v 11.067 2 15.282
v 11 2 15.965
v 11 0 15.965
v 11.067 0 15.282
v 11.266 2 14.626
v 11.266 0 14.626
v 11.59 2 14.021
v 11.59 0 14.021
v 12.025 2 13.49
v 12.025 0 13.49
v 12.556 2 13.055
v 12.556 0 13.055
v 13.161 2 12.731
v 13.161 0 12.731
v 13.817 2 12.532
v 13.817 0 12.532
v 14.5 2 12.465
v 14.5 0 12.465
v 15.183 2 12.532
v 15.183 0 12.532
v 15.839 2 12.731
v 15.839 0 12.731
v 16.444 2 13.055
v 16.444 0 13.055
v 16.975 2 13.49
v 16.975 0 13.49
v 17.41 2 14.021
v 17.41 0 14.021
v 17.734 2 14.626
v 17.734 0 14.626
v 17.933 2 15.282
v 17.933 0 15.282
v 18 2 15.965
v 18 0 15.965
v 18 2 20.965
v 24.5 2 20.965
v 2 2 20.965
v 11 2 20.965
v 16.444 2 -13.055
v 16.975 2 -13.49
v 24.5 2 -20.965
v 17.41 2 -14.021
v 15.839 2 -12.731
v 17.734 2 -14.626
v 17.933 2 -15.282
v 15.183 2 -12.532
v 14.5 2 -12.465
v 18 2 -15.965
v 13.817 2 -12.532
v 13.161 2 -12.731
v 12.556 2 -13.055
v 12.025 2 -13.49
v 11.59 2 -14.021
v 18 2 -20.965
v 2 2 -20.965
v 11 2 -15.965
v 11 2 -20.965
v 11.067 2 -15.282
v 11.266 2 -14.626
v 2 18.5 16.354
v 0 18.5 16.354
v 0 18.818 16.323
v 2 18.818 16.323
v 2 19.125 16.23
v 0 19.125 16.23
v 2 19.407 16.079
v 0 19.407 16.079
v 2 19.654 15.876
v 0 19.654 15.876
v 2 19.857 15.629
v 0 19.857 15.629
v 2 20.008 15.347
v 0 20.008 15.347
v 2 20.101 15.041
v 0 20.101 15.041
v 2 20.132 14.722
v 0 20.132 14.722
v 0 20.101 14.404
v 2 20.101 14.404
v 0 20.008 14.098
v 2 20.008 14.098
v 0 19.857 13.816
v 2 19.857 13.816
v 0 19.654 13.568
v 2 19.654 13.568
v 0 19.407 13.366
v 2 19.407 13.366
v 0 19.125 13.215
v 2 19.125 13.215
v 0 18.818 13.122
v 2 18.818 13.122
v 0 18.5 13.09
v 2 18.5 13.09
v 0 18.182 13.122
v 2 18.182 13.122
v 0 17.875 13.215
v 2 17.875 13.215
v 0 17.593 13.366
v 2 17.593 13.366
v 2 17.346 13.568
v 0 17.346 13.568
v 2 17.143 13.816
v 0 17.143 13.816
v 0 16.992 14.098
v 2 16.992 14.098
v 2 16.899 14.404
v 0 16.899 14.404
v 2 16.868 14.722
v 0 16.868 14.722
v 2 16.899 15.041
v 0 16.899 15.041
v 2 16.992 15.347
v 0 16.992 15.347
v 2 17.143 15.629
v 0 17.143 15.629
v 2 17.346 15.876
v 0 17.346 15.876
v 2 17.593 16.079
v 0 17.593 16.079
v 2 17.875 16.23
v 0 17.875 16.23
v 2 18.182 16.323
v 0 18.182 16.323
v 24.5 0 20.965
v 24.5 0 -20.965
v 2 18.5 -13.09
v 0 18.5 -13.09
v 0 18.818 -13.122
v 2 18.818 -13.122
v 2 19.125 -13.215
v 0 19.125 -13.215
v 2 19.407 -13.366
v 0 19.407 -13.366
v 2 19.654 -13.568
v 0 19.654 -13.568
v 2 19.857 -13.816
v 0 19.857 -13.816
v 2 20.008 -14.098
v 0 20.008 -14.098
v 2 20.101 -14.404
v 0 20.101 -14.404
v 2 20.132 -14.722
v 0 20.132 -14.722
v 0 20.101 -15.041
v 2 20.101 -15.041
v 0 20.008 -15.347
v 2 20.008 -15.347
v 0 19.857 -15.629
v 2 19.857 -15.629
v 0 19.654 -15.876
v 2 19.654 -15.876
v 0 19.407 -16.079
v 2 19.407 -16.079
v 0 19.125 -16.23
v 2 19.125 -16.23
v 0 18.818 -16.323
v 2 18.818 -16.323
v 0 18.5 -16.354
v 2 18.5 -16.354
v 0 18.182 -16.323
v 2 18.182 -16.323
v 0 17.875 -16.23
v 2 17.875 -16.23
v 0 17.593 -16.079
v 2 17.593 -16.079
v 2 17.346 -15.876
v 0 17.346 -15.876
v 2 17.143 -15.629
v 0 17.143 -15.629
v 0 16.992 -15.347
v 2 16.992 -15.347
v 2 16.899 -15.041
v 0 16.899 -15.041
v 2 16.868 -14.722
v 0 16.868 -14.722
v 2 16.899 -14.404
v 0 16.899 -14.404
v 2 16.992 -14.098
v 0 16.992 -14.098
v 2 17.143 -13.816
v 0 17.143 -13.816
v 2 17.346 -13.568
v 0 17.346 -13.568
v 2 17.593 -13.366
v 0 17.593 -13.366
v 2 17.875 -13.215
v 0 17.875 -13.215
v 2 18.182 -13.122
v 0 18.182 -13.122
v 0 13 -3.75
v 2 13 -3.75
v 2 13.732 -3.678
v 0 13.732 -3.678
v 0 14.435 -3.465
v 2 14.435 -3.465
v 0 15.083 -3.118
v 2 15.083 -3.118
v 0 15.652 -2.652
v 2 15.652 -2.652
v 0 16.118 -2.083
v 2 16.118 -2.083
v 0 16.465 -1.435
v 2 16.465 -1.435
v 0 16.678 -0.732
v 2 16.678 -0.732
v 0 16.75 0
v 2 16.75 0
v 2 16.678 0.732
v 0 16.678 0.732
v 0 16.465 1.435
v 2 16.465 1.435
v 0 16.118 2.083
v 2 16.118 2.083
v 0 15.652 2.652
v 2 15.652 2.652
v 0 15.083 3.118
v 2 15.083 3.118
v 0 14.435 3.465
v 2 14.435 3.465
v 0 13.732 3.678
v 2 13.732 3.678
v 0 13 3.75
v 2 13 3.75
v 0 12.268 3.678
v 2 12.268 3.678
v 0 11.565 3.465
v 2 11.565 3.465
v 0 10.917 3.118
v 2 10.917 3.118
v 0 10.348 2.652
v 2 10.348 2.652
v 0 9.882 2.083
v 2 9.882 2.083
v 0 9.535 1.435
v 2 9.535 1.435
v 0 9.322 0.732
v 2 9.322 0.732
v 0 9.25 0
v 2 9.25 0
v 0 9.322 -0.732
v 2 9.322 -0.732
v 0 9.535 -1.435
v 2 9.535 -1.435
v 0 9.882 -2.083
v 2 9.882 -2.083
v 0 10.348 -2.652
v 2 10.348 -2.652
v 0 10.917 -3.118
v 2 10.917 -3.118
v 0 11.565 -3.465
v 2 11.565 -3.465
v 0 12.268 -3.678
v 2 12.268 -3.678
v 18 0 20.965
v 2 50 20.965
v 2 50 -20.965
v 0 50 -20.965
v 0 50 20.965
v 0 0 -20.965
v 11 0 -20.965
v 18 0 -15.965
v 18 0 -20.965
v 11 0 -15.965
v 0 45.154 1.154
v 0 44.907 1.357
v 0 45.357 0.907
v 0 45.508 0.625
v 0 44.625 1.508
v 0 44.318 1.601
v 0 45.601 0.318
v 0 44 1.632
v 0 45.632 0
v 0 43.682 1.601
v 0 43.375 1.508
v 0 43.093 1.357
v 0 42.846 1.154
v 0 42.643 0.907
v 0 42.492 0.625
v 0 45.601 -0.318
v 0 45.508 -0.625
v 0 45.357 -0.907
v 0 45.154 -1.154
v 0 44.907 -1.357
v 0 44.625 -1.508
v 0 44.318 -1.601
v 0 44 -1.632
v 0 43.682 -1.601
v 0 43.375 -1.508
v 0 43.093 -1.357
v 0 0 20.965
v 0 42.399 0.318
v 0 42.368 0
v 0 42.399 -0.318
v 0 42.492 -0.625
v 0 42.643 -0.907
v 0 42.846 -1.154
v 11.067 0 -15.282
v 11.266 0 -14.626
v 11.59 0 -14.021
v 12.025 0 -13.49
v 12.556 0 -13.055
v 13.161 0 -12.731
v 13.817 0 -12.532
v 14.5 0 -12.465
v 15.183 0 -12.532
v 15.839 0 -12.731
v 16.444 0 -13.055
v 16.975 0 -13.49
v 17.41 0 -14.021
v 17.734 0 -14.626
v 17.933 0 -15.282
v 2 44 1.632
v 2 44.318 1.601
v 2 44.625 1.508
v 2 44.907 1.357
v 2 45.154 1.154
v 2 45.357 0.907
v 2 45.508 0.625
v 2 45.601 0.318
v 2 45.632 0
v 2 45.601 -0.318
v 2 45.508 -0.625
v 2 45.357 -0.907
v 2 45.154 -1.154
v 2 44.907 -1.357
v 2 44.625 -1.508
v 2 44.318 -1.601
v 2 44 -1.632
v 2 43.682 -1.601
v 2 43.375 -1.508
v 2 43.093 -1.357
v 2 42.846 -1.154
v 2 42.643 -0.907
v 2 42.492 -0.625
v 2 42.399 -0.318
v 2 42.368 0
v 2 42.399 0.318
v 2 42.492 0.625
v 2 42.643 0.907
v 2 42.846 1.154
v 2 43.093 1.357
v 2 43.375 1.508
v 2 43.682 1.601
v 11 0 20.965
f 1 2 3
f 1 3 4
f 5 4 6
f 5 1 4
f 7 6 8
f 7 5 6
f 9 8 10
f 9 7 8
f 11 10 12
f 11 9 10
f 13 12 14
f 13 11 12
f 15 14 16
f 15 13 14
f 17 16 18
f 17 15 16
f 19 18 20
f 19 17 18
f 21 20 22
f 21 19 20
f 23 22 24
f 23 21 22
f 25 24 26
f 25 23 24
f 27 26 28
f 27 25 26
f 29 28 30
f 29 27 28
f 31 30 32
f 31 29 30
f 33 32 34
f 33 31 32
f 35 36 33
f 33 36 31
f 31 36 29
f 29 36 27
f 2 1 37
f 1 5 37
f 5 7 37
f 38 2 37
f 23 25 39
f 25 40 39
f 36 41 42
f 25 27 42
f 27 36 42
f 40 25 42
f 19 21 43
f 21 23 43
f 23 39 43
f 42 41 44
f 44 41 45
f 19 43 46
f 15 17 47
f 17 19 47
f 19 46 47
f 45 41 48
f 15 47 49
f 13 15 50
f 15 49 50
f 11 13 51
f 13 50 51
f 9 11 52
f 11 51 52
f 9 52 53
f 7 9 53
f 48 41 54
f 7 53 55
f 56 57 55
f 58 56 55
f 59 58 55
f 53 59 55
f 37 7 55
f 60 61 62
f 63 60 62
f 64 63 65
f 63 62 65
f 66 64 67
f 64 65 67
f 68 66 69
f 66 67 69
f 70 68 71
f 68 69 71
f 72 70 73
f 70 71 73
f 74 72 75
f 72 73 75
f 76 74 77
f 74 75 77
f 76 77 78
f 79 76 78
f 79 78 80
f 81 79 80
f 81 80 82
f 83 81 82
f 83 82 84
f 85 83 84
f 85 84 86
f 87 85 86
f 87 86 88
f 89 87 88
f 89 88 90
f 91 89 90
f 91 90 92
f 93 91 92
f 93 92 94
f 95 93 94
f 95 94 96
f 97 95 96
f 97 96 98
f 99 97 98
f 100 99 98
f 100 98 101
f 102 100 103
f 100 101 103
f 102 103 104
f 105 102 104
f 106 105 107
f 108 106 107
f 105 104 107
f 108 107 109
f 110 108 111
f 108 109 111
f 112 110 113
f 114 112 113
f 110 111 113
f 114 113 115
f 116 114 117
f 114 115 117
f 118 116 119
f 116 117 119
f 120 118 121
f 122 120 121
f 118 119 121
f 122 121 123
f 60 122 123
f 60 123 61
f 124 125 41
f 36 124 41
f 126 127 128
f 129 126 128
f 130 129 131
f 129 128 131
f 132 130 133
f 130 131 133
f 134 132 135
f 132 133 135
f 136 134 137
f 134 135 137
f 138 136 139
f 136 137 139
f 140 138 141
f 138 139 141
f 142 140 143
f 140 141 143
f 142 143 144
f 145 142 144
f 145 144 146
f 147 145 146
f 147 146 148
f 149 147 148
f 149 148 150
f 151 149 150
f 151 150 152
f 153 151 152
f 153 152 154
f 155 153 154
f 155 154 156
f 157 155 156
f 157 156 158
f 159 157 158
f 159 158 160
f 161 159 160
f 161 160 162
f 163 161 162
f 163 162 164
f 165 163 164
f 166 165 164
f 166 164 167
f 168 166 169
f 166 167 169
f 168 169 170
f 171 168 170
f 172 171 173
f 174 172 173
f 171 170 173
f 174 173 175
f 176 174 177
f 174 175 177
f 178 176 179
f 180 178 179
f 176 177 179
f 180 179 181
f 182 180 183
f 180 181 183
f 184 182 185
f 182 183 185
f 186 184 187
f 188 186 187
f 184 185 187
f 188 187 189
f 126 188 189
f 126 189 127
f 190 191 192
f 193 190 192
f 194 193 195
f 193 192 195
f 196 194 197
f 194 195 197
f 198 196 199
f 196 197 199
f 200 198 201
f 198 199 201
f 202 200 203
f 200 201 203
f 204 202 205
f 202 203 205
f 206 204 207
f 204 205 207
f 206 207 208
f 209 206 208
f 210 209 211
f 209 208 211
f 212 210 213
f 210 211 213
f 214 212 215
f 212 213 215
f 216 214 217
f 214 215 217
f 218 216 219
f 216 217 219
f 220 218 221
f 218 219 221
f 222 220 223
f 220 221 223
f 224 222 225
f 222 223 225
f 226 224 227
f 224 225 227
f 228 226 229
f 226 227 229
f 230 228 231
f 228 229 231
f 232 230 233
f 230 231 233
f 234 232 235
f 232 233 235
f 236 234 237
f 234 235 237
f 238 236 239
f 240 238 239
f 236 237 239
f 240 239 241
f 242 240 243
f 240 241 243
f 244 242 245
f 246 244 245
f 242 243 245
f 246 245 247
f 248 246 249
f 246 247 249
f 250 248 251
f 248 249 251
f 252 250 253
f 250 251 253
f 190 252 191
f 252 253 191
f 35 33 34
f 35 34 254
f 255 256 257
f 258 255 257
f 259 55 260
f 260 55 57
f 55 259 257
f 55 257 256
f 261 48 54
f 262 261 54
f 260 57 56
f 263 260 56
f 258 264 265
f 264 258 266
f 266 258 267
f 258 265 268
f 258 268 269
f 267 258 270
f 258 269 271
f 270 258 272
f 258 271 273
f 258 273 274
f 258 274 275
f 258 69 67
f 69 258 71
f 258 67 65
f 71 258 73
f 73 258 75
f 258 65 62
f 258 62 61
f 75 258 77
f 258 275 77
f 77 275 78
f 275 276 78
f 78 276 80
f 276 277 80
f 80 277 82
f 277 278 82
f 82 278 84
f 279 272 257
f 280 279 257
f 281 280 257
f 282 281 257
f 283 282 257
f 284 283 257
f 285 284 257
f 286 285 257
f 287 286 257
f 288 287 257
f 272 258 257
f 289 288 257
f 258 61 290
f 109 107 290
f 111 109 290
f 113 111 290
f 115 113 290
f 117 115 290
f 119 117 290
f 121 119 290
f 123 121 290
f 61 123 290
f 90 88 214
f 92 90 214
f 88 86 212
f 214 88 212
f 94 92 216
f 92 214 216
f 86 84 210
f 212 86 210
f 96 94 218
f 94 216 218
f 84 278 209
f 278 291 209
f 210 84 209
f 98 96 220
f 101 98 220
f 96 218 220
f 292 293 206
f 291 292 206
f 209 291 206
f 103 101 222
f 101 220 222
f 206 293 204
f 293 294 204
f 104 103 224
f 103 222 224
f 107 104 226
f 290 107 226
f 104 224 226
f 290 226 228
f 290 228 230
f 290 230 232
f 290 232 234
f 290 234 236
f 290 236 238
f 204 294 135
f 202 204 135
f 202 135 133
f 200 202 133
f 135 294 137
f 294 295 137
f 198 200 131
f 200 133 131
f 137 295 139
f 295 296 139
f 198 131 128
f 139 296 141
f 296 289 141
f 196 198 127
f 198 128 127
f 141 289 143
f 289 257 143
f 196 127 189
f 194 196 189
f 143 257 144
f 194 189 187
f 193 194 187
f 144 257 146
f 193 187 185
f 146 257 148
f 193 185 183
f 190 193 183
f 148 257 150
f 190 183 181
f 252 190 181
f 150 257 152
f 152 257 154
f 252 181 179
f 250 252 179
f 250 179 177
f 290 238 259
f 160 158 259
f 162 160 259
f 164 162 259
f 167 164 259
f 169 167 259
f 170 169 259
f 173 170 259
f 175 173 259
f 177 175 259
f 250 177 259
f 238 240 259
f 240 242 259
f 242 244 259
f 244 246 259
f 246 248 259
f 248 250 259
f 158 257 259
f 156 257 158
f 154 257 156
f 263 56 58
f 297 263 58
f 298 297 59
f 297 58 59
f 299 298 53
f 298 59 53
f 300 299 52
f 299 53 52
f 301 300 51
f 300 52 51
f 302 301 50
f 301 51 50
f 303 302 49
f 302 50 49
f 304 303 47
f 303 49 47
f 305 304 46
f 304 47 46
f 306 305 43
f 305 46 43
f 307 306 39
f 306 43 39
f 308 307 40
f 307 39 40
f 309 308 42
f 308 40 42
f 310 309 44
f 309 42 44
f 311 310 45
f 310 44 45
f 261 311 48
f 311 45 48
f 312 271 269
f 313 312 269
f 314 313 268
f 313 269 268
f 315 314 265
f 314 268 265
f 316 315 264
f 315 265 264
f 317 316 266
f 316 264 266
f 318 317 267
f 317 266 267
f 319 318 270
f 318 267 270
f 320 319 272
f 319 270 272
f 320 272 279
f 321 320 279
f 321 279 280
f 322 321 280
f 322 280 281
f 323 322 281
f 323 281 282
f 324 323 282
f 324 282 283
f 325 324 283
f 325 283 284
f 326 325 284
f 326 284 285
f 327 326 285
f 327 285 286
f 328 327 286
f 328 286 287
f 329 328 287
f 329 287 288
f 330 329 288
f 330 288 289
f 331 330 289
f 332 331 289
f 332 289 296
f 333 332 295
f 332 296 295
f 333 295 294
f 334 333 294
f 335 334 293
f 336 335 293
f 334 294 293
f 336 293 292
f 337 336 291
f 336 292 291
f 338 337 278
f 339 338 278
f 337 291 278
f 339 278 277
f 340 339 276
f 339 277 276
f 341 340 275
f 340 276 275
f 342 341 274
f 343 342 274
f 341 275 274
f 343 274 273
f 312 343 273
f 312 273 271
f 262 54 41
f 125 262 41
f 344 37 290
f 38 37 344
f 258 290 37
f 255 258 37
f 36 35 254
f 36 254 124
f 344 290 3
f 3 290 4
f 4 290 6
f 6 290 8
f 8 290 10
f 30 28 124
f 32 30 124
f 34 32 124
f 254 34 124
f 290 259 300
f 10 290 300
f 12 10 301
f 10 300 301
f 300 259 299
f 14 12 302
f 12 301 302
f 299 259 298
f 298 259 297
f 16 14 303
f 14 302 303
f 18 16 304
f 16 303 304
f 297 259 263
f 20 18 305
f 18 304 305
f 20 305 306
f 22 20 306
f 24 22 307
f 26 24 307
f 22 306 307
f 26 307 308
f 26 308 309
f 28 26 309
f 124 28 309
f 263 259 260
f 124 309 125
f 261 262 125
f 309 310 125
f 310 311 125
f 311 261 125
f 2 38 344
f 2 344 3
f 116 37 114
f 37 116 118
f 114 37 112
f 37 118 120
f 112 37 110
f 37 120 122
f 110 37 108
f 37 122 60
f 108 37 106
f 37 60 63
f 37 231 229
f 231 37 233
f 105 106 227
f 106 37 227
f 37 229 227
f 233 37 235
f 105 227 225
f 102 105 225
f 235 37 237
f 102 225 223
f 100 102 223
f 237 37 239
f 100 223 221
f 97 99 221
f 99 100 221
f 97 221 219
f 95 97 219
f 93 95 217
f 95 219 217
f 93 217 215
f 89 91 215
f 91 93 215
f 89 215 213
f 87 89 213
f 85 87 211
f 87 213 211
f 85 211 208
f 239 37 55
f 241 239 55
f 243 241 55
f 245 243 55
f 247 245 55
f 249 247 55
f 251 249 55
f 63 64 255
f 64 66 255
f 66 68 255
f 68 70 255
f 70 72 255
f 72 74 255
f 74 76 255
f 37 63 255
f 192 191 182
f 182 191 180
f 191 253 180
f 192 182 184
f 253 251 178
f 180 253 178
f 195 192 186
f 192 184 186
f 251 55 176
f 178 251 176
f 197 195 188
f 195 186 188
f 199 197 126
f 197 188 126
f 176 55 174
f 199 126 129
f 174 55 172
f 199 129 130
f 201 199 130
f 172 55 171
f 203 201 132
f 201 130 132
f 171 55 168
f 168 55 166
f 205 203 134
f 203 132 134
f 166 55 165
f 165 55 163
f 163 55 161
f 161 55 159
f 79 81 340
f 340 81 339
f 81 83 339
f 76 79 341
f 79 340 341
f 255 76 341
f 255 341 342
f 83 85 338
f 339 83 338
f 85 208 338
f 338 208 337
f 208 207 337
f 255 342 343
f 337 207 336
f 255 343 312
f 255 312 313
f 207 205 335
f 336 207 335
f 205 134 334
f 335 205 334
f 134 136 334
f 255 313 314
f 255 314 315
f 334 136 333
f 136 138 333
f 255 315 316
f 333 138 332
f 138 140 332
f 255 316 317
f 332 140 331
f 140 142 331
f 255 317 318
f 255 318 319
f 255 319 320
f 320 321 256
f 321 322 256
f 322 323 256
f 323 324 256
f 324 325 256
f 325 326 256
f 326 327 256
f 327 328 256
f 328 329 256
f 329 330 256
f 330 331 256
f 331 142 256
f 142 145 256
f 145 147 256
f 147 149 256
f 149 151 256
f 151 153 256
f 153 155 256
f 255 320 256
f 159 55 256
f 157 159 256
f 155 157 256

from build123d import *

# Parameters (mm, degrees)
BOSS_EXTRUDE1_DEPTH      = 20.965
BOSS_EXTRUDE1_DEPTH_BACK = 20.965
F_4_CLEARANCE_HOLE1_D    = 3.2639
CUT_EXTRUDE1_DEPTH       = 2
SKETCH7_R                = 3.75
CUT_EXTRUDE2_DEPTH       = 2


with BuildPart() as part:
    # Sketch1 → Boss-Extrude1 (new, two sides: drawn at the far end of the back side and taken through both)
    with BuildSketch(Plane.XY.offset(-BOSS_EXTRUDE1_DEPTH_BACK)):
        Polygon((0, 50), (0, 0), (24.5, 0), (24.5, 2), (2, 2), (2, 50), align=None)
    extrude(amount=BOSS_EXTRUDE1_DEPTH + BOSS_EXTRUDE1_DEPTH_BACK)

    # #4 Clearance Hole1 (through all)
    with Locations(Plane(origin=(2, 0, 0), x_dir=(0, 0, -1), z_dir=(1, 0, 0))):
        with Locations((0, 44), (-14.722431864, 18.5), (14.722431864, 18.5)):
            Hole(F_4_CLEARANCE_HOLE1_D / 2)

    # Sketch6 → Cut-Extrude1 (cut)
    with BuildSketch(Plane(origin=(0, 2, 0), x_dir=(1, 0, 0), z_dir=(0, 1, 0))):
        with BuildLine():
            Line((11, -20.965), (11, -15.965))
            ThreePointArc((11, -15.965), (14.5, -12.465), (18, -15.965))
            Line((18, -15.965), (18, -20.965))
            ThreePointArc((18, -20.965), (14.5, -24.465), (11, -20.965))
        make_face()
    cut_extrude1 = extrude(amount=-CUT_EXTRUDE1_DEPTH, mode=Mode.SUBTRACT)

    # Mirror1: Cut-Extrude1 across plane
    add(cut_extrude1.mirror(Plane.XY), mode=Mode.SUBTRACT)

    # Sketch7 → Cut-Extrude2 (cut)
    with BuildSketch(Plane(origin=(2, 0, 0), x_dir=(0, 0, -1), z_dir=(1, 0, 0))):
        with Locations((0, 13)):
            Circle(SKETCH7_R)
    extrude(amount=-CUT_EXTRUDE2_DEPTH, mode=Mode.SUBTRACT)


solid = part.part
